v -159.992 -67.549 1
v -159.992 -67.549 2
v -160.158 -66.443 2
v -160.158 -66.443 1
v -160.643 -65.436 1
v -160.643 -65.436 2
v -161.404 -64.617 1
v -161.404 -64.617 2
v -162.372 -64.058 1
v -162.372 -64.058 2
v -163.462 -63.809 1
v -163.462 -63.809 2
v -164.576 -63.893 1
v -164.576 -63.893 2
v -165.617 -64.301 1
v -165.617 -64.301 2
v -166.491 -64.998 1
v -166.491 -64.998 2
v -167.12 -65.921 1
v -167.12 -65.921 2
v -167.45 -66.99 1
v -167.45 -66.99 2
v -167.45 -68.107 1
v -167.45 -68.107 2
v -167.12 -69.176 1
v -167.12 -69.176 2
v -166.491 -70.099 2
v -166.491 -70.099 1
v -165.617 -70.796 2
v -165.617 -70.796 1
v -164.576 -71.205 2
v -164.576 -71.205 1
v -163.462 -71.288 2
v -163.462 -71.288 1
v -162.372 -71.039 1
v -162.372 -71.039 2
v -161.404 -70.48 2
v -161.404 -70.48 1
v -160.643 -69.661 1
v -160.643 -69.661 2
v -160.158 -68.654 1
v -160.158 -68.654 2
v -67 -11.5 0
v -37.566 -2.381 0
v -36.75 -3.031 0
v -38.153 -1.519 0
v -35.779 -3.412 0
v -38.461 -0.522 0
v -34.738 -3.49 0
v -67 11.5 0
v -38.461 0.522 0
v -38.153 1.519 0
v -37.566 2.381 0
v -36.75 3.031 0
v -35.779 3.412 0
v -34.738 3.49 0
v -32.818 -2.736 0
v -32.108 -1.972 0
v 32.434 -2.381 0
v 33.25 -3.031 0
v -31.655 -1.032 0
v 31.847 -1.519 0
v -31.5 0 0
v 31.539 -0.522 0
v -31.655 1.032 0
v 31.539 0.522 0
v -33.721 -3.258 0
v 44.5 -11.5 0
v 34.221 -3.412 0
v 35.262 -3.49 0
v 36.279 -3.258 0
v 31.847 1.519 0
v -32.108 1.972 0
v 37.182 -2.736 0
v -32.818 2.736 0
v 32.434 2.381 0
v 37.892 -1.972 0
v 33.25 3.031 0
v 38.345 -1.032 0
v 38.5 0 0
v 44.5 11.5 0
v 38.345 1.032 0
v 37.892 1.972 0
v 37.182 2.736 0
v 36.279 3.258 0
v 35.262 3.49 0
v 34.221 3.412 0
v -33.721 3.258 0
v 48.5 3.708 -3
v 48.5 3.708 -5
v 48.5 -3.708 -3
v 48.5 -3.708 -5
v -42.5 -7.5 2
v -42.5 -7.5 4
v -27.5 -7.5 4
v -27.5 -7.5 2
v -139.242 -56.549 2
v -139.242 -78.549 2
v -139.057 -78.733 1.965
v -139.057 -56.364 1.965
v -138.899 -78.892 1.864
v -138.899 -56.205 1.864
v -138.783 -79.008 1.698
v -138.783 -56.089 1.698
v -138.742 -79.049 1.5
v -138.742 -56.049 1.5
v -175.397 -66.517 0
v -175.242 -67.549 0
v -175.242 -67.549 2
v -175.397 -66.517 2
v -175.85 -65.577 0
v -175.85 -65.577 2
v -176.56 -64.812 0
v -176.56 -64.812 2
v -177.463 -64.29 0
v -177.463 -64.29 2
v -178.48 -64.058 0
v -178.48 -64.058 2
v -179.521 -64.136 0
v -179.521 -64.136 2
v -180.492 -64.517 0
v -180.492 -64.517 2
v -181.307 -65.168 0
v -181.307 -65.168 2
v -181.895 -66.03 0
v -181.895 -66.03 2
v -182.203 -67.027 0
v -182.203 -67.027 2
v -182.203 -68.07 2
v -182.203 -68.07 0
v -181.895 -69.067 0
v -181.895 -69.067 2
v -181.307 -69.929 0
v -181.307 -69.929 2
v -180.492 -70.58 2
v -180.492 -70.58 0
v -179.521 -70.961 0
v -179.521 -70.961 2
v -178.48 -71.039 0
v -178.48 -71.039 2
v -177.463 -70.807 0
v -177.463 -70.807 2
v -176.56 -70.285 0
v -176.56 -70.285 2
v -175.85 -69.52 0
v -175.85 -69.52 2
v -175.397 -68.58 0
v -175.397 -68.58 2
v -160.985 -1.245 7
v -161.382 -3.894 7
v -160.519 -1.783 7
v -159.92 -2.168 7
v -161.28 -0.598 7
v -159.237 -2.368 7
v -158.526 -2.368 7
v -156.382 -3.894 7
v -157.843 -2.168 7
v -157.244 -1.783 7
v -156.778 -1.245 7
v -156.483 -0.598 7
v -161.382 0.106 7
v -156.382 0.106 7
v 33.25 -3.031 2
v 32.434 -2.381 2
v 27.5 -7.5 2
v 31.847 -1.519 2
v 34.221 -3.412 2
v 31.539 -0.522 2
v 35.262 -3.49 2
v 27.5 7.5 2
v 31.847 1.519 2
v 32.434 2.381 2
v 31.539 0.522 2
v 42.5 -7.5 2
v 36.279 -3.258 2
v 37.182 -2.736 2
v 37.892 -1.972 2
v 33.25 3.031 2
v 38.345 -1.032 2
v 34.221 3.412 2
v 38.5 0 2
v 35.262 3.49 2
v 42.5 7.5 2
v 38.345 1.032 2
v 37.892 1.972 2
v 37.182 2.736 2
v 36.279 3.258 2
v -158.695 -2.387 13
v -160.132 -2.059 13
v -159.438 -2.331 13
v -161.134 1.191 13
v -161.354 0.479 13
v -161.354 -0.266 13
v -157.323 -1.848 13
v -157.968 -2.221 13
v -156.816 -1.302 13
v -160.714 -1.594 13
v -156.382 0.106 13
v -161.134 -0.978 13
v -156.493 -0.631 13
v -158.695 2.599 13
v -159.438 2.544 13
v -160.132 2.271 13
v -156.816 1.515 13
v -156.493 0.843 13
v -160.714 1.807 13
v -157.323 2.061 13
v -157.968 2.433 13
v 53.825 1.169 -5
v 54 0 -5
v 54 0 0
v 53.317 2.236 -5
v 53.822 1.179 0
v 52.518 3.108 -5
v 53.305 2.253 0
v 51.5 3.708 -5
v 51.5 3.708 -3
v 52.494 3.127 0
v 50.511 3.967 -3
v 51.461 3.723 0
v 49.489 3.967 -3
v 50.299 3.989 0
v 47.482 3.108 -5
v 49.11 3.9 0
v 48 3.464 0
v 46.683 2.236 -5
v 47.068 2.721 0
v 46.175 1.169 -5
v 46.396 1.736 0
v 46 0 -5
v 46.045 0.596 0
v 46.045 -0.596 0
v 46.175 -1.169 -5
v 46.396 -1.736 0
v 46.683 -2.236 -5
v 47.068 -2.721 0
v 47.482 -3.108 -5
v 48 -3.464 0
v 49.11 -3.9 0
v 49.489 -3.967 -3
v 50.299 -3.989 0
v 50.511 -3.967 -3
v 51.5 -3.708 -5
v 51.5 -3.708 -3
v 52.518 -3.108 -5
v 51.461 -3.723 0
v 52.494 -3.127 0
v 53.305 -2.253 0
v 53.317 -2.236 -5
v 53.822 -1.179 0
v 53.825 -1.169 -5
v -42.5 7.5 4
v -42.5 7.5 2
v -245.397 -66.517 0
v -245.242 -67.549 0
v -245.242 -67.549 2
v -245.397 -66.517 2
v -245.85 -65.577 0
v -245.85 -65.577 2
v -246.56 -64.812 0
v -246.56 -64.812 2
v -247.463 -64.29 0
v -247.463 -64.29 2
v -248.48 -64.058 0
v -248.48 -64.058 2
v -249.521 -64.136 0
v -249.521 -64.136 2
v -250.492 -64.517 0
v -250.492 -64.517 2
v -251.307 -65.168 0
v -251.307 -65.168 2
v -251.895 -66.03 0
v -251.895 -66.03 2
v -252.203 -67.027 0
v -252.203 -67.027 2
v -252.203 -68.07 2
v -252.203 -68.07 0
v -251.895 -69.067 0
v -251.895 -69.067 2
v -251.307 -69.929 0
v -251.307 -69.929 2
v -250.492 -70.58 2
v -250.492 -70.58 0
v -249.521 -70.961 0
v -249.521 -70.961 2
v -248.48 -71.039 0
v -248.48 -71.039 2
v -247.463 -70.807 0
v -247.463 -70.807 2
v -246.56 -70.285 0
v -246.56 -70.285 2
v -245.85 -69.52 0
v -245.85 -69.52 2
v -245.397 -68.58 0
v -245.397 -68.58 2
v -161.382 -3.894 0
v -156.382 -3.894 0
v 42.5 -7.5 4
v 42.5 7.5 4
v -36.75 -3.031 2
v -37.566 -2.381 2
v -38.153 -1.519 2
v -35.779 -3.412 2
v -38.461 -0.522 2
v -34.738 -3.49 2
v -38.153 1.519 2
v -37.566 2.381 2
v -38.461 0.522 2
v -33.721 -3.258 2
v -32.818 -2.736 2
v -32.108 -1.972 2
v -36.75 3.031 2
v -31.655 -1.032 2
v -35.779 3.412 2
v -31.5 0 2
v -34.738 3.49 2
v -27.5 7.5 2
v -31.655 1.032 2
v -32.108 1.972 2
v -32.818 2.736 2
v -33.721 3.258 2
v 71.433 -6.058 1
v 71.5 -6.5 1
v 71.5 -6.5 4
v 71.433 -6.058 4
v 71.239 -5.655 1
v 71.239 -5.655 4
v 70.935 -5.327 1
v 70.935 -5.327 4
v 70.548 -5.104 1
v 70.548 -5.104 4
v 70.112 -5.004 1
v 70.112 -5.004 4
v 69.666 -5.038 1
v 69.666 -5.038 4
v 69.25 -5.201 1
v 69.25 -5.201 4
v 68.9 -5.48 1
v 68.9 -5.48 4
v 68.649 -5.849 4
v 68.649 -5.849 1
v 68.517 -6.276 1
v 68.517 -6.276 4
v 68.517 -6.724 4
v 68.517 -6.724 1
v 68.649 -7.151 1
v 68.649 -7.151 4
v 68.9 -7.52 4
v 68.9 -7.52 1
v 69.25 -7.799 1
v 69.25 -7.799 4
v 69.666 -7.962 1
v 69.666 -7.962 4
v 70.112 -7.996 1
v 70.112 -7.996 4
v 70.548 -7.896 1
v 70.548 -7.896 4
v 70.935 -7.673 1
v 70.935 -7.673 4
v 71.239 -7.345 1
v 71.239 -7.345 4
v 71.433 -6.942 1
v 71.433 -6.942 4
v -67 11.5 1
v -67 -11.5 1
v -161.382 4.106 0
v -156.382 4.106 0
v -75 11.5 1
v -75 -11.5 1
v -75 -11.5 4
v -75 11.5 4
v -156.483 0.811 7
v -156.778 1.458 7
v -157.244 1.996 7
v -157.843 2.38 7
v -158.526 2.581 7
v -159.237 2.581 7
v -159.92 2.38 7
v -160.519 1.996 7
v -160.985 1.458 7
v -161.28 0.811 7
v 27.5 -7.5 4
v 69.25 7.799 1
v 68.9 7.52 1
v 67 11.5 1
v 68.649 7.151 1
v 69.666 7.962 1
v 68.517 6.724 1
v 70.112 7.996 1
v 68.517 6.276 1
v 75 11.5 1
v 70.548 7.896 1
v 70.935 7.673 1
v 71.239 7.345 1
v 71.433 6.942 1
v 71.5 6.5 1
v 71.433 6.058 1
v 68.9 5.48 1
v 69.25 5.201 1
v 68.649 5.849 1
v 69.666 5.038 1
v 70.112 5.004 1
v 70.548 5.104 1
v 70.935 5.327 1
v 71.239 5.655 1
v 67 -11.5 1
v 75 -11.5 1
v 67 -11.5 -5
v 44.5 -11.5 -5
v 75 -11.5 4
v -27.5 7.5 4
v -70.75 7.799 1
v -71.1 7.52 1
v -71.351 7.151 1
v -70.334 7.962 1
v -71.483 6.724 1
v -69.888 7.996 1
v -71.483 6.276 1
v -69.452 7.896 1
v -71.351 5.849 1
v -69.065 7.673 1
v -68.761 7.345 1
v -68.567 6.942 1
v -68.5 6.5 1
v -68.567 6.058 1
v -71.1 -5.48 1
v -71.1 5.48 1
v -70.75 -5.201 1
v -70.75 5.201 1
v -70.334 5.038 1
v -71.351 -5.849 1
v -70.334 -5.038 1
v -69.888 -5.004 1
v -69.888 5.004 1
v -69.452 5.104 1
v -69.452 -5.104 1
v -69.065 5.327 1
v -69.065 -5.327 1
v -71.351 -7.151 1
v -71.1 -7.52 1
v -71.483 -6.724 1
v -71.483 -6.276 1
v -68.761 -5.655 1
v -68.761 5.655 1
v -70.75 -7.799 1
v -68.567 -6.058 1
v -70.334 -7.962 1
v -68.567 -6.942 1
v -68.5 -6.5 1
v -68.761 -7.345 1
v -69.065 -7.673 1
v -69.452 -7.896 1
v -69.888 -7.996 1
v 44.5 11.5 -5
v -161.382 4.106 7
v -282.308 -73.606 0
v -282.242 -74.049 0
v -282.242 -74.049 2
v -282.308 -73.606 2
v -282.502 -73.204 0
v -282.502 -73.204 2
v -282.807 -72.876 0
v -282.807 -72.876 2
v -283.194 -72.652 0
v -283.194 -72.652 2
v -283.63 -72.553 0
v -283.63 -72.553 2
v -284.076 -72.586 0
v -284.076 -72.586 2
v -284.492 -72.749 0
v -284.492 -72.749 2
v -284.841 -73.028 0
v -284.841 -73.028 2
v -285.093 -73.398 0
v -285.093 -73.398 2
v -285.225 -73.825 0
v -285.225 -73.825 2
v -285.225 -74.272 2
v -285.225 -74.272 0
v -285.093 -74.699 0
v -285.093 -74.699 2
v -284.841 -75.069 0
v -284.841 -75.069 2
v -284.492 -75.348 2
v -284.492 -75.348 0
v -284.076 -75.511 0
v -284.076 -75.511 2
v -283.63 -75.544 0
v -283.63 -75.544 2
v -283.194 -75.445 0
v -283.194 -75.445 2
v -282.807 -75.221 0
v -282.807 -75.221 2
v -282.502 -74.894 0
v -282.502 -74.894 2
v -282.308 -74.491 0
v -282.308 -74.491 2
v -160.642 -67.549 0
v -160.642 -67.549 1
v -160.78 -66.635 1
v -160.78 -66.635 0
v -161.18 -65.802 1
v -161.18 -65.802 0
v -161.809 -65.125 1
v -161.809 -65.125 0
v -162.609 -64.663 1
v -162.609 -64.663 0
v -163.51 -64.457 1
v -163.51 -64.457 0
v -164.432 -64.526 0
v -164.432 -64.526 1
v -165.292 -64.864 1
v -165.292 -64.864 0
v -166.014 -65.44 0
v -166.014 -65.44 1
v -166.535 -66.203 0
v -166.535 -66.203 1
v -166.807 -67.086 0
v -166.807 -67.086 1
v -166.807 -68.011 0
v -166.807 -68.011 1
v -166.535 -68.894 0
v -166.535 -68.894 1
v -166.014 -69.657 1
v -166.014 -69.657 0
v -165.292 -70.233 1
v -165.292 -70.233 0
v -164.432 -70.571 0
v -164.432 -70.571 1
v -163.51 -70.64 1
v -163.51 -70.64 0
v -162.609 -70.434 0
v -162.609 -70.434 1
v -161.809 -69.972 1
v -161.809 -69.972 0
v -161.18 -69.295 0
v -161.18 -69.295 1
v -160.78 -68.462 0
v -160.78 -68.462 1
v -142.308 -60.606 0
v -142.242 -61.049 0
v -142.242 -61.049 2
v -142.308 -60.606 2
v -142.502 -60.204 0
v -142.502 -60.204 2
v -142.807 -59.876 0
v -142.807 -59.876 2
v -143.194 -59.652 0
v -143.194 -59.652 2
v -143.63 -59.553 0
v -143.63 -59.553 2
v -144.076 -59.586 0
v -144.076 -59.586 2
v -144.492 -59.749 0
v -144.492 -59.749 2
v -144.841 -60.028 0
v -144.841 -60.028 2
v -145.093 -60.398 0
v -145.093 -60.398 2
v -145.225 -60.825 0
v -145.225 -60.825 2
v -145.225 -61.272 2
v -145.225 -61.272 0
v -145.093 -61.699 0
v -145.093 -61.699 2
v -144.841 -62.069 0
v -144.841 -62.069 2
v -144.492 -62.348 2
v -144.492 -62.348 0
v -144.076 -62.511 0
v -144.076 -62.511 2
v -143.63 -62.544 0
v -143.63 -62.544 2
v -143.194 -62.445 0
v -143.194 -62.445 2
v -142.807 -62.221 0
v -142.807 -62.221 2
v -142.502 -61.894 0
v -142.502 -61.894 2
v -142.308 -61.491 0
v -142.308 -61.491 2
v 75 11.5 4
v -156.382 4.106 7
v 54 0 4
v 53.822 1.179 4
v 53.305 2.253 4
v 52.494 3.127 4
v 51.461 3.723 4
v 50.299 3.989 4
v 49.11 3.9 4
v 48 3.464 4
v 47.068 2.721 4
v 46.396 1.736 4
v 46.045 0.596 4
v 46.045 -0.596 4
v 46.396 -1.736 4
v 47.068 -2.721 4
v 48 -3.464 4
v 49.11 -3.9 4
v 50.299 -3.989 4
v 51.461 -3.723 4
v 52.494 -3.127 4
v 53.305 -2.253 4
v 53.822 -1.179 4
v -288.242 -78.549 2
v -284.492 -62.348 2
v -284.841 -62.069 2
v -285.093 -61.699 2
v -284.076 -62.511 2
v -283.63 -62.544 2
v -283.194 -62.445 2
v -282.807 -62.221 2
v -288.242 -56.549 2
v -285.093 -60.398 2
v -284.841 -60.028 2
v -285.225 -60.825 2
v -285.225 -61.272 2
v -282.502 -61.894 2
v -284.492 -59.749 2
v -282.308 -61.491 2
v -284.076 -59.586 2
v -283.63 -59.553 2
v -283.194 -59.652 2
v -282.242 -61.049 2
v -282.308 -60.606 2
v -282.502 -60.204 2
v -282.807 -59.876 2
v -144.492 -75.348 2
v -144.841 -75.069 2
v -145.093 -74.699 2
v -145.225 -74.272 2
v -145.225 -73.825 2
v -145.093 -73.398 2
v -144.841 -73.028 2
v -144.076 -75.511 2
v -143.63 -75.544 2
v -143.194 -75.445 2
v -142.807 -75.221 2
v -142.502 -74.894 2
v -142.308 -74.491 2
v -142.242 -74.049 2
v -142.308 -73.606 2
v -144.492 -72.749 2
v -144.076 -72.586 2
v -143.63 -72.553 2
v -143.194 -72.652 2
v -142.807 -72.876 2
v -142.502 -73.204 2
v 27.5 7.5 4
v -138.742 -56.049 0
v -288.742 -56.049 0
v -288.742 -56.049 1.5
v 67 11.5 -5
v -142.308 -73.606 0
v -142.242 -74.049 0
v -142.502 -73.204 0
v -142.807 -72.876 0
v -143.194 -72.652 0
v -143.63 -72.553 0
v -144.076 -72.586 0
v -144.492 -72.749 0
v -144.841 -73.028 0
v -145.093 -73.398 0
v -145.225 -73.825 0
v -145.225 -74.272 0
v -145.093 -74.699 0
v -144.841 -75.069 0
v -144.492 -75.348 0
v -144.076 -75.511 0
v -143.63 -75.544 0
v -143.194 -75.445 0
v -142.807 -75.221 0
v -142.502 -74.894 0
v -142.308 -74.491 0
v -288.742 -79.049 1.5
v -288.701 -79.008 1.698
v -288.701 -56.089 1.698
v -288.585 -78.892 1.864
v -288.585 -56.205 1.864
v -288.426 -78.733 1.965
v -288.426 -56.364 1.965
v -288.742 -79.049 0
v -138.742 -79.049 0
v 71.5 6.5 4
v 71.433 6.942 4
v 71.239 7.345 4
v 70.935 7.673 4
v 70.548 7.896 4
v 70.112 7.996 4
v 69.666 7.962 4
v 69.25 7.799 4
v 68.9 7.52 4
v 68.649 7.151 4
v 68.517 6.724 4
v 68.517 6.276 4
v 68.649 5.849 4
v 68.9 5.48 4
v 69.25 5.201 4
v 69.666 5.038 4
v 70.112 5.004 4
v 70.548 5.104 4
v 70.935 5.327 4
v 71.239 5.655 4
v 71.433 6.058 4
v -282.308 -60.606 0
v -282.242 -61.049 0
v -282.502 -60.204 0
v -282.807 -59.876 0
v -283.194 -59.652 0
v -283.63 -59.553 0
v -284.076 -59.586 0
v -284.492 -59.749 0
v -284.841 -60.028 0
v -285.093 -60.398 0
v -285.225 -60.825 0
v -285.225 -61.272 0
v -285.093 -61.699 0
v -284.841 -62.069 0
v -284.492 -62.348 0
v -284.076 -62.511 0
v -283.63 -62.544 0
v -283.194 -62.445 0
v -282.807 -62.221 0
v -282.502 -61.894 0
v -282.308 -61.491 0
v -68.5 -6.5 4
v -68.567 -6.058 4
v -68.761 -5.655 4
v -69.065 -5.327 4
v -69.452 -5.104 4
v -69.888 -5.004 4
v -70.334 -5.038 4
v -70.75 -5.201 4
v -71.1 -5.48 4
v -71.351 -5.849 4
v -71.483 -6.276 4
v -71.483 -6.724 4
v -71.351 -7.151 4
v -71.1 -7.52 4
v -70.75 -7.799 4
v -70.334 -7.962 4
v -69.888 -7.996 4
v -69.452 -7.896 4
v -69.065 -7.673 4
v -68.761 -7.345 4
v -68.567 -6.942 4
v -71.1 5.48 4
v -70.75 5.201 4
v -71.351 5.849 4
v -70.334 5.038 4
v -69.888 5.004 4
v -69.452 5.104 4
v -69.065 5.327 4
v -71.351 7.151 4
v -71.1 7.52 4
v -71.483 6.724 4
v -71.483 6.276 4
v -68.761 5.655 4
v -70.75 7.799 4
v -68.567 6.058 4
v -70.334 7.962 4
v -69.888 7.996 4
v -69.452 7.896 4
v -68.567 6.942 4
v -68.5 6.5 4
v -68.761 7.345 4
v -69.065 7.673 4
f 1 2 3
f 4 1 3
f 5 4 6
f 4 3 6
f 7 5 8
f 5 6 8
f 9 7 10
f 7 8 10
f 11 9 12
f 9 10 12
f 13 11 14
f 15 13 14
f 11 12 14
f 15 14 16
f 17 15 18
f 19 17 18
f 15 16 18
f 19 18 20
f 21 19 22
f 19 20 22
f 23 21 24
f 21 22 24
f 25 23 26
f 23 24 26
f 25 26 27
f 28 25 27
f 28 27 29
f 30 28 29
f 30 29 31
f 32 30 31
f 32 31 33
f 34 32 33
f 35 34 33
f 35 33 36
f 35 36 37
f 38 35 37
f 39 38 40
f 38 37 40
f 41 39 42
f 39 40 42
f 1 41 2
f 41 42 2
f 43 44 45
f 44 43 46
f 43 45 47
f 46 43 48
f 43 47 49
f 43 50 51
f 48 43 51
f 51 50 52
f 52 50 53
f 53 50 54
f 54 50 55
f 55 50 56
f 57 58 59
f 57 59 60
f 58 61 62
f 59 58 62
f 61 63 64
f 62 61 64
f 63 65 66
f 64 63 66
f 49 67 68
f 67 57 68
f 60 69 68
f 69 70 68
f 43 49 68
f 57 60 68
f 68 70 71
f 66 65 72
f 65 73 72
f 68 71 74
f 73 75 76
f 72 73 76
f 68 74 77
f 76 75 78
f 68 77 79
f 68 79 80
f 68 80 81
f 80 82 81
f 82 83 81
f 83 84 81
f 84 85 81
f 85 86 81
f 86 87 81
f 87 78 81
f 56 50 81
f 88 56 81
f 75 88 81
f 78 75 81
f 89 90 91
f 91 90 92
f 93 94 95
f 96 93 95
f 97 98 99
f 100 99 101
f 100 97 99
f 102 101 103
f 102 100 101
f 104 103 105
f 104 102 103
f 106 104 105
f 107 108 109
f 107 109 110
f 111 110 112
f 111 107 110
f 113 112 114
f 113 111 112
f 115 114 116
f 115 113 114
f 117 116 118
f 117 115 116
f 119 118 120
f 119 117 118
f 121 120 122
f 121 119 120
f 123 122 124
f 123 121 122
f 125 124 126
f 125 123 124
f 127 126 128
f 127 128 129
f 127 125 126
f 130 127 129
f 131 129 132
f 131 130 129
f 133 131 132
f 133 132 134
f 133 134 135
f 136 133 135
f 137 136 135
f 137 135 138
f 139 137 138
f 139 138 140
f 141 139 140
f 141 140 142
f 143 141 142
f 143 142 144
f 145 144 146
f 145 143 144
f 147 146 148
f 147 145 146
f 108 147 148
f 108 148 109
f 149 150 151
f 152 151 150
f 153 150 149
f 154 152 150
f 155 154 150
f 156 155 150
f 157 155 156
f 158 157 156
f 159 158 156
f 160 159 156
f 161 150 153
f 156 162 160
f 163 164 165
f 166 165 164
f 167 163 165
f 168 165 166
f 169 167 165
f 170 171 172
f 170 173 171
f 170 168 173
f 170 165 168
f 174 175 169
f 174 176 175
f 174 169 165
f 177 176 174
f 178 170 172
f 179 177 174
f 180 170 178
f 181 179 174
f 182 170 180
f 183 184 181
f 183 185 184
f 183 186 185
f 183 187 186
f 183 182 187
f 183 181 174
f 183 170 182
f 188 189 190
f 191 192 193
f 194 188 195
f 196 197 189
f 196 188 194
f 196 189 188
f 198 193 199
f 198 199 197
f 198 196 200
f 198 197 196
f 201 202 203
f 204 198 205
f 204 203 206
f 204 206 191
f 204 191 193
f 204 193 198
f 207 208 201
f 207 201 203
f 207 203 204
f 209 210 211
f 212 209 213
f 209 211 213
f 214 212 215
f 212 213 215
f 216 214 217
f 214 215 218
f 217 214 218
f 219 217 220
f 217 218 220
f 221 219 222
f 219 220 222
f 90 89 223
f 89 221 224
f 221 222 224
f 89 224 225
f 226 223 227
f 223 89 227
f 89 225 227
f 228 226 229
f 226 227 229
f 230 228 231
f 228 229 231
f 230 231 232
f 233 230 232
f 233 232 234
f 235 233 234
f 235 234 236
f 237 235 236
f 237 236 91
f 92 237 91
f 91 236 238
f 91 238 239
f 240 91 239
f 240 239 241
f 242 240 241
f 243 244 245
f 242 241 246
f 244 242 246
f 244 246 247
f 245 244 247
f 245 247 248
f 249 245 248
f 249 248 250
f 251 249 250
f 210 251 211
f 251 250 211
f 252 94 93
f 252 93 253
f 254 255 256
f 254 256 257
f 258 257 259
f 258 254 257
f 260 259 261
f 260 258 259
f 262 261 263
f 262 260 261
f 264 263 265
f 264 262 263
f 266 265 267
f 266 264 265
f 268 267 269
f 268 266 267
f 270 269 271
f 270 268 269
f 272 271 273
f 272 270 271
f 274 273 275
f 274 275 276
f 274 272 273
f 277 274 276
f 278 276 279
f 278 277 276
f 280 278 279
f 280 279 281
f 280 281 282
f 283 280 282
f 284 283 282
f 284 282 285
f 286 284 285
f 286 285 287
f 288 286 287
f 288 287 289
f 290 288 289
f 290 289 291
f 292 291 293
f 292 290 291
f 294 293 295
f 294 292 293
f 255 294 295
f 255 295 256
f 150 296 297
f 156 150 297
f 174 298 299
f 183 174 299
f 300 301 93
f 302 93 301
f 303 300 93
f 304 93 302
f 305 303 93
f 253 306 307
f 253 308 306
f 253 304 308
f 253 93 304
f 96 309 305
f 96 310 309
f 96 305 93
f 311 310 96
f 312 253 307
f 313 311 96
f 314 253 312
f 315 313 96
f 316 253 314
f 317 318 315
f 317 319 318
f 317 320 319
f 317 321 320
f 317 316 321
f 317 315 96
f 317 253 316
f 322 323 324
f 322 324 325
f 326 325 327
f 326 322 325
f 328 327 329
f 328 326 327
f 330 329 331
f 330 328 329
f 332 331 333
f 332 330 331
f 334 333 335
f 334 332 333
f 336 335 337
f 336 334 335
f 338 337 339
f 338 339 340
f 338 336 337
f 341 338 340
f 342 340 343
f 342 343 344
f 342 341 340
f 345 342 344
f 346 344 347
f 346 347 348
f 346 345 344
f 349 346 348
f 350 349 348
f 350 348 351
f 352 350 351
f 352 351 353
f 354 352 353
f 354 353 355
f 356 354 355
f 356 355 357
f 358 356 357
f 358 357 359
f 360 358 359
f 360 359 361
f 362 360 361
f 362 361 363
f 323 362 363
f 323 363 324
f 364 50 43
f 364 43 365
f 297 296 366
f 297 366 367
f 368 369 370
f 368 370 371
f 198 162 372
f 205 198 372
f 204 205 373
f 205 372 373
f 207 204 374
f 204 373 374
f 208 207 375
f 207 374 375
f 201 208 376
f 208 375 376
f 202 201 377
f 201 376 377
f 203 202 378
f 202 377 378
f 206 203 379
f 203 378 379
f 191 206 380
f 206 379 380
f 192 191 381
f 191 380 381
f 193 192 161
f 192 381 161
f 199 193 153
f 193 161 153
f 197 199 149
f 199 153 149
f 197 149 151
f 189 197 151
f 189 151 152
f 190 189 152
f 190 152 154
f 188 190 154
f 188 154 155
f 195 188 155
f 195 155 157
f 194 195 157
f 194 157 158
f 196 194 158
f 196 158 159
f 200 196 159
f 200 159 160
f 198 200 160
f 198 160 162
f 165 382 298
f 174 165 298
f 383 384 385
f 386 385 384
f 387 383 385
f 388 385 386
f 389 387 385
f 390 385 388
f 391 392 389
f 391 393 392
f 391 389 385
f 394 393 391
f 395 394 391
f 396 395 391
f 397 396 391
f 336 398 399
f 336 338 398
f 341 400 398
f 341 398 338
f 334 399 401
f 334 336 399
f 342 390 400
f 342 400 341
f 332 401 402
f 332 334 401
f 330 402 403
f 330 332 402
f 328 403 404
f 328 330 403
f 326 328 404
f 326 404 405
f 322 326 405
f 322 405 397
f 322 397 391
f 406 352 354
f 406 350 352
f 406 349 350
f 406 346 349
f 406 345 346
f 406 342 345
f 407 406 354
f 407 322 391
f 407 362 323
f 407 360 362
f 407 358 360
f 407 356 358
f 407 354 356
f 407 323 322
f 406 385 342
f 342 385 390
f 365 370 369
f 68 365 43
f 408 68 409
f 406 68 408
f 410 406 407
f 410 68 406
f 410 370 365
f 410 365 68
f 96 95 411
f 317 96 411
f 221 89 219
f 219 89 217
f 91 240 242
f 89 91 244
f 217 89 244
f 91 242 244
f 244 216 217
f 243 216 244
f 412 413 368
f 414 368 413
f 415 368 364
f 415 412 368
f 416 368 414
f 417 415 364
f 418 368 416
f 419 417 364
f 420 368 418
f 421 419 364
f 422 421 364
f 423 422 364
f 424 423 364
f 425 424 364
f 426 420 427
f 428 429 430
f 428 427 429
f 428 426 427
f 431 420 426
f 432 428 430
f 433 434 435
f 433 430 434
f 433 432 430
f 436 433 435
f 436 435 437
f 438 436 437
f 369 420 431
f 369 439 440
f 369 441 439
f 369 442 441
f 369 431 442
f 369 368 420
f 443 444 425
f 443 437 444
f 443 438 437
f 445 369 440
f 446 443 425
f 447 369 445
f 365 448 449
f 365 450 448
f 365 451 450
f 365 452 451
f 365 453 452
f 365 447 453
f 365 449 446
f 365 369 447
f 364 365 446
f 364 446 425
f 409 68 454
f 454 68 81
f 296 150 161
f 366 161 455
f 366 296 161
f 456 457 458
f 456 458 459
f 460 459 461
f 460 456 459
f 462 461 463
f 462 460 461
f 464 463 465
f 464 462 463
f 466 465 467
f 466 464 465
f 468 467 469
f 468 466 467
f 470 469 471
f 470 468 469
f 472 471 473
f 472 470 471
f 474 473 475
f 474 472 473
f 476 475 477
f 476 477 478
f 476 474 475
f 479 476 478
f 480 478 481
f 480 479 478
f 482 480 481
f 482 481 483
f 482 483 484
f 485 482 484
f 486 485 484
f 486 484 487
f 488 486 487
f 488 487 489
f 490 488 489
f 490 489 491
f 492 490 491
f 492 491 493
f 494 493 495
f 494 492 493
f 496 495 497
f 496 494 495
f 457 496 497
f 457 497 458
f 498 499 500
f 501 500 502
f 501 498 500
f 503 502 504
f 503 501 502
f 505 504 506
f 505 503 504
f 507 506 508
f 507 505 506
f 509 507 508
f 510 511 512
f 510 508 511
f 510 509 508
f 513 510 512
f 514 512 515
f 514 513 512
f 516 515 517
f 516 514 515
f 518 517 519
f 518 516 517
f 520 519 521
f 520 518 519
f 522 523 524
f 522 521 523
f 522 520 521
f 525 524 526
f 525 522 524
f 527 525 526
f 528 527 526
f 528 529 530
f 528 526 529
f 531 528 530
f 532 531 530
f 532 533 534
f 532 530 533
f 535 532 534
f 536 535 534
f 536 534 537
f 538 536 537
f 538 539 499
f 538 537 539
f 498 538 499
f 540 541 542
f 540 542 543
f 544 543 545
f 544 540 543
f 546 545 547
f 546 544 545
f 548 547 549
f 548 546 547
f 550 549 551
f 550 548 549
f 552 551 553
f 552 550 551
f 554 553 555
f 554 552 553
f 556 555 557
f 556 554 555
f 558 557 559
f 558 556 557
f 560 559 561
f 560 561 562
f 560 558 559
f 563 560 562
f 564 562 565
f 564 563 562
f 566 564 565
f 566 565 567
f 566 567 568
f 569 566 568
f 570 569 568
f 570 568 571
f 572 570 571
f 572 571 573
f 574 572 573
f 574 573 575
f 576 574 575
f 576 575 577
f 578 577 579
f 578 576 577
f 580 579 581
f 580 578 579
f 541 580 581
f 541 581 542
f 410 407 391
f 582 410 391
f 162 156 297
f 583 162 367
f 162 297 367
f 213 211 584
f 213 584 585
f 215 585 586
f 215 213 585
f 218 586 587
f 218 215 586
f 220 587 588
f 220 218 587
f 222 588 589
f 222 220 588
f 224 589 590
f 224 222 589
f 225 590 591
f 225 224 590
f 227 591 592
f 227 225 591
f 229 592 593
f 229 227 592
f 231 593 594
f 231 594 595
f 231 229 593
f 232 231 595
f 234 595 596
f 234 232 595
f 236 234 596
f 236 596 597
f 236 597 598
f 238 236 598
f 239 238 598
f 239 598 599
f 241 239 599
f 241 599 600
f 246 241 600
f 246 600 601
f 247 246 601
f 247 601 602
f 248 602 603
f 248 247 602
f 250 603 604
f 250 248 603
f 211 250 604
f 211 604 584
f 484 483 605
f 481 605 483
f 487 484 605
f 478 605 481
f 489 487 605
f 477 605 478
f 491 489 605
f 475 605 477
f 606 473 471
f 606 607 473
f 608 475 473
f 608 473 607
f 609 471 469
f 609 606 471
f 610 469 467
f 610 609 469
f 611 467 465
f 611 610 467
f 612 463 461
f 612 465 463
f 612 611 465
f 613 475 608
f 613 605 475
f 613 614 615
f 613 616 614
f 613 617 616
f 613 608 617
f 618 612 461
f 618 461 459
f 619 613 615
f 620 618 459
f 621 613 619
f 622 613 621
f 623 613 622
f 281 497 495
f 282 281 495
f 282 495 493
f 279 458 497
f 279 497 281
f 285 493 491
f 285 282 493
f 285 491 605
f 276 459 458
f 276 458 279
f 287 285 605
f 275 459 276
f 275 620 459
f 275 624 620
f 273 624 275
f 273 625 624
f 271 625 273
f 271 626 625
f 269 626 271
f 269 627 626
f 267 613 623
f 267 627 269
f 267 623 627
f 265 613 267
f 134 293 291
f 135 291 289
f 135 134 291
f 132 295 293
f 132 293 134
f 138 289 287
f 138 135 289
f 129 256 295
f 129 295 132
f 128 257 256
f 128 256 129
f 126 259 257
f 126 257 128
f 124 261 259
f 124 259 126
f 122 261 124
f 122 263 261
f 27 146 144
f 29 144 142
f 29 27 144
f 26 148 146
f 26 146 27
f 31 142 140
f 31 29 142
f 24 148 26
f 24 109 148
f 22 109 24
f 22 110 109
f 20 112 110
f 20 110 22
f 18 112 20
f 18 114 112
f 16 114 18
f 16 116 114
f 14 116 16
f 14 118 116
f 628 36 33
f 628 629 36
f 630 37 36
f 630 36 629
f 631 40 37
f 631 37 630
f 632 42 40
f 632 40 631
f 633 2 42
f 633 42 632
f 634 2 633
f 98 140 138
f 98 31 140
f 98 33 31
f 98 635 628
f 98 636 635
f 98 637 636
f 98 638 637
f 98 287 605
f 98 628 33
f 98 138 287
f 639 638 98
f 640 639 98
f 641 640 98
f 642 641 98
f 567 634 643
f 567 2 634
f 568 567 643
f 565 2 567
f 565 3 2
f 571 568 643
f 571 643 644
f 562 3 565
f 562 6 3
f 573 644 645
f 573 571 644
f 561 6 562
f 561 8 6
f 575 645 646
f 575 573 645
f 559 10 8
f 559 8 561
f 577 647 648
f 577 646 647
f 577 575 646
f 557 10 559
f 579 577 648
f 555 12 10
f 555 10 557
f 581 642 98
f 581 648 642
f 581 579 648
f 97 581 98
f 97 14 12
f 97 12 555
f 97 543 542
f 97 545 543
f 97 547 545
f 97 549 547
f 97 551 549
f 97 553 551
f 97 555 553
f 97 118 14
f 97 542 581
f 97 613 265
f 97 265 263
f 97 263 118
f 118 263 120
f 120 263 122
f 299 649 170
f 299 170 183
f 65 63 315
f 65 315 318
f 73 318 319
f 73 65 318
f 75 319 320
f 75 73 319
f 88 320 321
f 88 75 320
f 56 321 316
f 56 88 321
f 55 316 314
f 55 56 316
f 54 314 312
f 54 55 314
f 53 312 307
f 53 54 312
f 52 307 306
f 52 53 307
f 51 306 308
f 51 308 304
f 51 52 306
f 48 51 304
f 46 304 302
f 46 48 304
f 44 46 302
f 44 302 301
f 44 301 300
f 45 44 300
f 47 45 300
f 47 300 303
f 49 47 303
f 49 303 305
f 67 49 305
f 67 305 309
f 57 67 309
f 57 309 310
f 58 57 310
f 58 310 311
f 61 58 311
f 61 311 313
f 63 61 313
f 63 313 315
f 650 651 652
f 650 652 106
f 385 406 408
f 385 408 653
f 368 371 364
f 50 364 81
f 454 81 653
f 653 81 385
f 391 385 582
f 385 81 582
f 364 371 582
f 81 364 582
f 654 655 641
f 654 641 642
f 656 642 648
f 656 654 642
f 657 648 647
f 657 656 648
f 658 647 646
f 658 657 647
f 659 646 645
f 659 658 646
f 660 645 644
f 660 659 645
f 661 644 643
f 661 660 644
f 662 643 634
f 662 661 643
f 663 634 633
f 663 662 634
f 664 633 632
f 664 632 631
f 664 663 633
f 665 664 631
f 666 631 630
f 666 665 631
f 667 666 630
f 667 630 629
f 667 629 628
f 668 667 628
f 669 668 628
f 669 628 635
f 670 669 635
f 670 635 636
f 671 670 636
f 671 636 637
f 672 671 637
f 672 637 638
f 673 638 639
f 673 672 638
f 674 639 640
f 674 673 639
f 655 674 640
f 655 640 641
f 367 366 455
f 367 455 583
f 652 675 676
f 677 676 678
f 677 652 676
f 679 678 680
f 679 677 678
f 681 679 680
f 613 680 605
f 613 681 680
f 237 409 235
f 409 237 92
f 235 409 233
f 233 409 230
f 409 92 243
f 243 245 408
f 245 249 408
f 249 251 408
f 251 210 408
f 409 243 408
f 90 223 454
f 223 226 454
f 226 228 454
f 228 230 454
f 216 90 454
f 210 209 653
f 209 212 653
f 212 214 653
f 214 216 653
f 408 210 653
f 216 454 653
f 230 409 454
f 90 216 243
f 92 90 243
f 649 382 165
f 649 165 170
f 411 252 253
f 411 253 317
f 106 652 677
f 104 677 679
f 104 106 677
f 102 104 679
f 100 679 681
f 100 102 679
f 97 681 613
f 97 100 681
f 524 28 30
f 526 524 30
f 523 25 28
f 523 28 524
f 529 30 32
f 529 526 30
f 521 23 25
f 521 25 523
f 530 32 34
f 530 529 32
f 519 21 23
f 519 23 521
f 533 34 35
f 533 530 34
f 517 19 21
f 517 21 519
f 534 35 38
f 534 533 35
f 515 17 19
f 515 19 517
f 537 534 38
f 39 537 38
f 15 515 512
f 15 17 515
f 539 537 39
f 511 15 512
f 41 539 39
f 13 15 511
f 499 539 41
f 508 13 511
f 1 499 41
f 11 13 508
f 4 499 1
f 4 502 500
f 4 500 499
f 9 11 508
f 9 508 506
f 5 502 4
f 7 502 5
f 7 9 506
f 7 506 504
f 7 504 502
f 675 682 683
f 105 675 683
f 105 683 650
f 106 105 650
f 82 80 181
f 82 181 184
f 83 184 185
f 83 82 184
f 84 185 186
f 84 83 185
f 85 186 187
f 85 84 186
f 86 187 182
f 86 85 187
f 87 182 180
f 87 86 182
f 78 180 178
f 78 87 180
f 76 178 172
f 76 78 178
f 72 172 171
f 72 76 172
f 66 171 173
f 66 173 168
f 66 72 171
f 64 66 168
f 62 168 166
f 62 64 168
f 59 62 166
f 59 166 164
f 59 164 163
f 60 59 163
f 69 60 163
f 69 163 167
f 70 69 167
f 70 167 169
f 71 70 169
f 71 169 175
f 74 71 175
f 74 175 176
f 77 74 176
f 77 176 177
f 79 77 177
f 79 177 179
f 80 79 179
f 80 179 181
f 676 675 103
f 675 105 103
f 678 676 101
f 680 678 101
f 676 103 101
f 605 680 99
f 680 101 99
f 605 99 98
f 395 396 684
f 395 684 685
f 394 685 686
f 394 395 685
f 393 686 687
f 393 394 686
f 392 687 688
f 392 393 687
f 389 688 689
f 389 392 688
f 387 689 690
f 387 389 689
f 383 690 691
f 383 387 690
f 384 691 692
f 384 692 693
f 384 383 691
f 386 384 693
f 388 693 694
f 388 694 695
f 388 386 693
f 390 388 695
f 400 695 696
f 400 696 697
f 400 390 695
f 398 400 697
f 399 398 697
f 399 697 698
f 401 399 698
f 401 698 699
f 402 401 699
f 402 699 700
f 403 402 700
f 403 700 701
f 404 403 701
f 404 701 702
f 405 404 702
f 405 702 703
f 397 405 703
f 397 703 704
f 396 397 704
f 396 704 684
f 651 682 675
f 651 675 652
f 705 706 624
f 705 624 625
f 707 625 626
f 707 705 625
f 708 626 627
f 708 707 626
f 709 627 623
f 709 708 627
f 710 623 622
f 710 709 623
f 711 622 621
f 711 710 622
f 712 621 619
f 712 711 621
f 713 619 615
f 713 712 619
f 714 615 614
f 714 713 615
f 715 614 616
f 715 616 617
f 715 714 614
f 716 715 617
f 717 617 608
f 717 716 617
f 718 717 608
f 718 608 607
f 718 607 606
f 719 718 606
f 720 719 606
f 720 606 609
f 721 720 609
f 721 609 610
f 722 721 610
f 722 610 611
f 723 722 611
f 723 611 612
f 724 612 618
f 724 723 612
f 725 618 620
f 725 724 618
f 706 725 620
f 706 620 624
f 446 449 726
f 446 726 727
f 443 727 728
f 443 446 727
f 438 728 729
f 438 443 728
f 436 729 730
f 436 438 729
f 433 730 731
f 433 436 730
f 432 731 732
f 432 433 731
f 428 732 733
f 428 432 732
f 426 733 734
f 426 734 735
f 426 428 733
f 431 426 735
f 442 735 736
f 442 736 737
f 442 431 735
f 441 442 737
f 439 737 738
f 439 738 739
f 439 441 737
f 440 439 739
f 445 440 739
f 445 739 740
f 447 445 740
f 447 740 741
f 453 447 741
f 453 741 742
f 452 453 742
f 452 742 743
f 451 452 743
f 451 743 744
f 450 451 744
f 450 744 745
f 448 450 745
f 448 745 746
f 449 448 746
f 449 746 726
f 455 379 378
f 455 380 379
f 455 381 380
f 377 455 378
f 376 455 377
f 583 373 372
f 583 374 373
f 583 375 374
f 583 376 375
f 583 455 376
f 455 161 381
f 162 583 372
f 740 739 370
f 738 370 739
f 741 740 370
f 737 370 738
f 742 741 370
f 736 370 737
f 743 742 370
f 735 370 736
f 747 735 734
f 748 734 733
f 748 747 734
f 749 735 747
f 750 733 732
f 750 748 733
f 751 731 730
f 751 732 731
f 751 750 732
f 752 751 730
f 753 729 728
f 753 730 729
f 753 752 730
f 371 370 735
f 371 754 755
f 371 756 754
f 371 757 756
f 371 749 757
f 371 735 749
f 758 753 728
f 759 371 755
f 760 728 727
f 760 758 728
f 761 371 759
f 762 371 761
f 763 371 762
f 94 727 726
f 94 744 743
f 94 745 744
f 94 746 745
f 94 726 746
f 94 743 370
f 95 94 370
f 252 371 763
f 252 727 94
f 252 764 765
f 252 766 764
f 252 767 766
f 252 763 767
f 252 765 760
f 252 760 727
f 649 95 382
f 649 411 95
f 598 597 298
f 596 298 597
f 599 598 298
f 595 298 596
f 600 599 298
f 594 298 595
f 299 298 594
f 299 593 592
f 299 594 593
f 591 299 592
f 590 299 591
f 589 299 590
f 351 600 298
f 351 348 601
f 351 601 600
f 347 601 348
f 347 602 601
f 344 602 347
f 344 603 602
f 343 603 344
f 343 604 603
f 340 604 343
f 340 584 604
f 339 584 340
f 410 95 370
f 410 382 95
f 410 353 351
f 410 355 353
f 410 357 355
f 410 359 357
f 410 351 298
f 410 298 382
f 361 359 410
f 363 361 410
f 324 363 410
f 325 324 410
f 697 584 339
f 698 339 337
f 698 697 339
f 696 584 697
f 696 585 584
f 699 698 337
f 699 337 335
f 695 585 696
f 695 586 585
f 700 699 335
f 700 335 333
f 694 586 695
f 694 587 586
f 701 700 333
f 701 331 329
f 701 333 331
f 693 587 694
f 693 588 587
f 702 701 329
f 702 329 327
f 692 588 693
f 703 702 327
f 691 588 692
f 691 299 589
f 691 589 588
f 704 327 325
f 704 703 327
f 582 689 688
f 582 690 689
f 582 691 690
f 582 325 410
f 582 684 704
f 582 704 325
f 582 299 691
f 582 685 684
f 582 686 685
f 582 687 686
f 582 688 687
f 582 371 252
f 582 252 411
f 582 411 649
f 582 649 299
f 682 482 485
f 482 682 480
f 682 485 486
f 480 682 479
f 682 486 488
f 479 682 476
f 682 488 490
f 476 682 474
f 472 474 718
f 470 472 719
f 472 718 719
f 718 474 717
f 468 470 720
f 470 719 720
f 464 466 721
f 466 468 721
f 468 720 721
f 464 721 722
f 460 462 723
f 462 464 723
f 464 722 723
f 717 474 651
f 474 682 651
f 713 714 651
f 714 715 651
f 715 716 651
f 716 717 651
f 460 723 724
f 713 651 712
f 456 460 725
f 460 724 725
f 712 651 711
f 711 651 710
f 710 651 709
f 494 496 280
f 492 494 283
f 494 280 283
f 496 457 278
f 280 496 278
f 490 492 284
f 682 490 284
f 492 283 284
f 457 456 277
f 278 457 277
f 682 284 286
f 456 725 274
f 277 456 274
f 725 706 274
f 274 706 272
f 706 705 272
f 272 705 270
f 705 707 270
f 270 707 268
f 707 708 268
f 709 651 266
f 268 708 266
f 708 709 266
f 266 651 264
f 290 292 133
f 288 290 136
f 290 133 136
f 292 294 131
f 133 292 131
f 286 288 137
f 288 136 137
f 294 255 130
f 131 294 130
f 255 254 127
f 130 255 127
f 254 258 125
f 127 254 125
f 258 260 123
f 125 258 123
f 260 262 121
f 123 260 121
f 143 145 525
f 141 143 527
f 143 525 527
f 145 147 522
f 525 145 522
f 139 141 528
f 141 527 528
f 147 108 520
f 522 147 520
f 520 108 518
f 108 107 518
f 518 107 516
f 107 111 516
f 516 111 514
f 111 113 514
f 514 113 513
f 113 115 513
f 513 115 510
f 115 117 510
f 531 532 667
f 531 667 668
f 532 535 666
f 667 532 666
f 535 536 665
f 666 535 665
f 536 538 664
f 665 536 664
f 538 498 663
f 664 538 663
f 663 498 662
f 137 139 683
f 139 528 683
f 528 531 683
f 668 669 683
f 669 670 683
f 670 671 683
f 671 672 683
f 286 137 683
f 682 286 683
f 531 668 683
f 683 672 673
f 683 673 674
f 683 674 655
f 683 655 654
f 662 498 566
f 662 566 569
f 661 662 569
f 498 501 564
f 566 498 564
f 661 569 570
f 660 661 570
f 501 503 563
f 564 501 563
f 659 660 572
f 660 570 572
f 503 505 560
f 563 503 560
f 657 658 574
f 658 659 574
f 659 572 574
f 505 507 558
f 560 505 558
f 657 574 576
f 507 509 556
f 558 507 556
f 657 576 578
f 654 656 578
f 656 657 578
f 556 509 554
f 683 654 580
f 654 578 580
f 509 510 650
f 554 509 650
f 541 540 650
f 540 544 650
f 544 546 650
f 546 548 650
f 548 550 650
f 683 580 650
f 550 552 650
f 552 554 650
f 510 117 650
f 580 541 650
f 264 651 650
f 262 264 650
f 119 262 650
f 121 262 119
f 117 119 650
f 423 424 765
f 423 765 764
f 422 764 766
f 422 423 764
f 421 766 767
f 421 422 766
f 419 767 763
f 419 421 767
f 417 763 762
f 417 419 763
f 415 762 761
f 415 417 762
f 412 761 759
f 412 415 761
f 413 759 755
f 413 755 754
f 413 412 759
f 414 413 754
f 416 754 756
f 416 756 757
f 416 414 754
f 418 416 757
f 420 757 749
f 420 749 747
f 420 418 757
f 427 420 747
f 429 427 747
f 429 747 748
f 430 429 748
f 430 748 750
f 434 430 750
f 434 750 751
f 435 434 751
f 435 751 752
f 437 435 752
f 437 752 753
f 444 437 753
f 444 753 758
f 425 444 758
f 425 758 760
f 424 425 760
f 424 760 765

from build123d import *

# Parameters (mm, degrees)
F1_W      = 5
F1_H      = 8
F2_DEPTH  = 7
F4_DEPTH  = 6
F0_W      = 150
F0_H      = 23
F0_R      = 1.5
F0_R_2    = 3.5
F0_R_3    = 4
F5_DEPTH  = 4
F6_W      = 150
F6_H      = 23
F6_R      = 1.5
F6_R_2    = 3.5
F6_R_3    = 3.1
F7_DEPTH  = 2
F8_R      = 3.75
F9_DEPTH  = 1
F10_W     = 8
F10_H     = 1
F11_DEPTH = 30
F12_W     = 15
F12_H     = 15
F12_R     = 3.5
F13_DEPTH = 2
F14_R     = 4
F15_DEPTH = 3
F17_R     = 0.5
F16_W     = 22.5
F16_H     = 23
F16_R     = 4
F18_DEPTH = 5
F19_W     = 3
F19_H     = 7.4161984871
F20_DEPTH = 2


with BuildPart() as f2:
    # F1 (on Top) → F2 (new body)
    with BuildSketch(Plane.XY):
        with Locations((-158.8816171885, 0.1063133087)):
            Rectangle(F1_W, F1_H)
    extrude(amount=F2_DEPTH)

    # F3 (on face) → F4 (join)
    with BuildSketch(Plane.XY.offset(7)):
        with BuildLine():
            ThreePointArc((-161.3816171885, 0.1063133087), (-158.8816171885, -2.3936866913), (-156.3816171885, 0.1063133087))
            ThreePointArc((-156.3816171885, 0.1063133087), (-158.8816171885, 2.6063133087), (-161.3816171885, 0.1063133087))
        make_face()
    extrude(amount=F4_DEPTH)

    # F14 (on face) → F15 (cut)
    with BuildSketch(Plane.XY.offset(4)):
        with Locations((50, 0)):
            Circle(F14_R)
    extrude(amount=-F15_DEPTH, mode=Mode.SUBTRACT)


with BuildPart() as f5:
    # F0 (on Top) → F5 (new body)
    with BuildSketch(Plane.XY):
        Rectangle(F0_W, F0_H)
        with Locations((-70, -6.5)):
            Circle(F0_R, mode=Mode.SUBTRACT)
        with Locations((70, -6.5)):
            Circle(F0_R, mode=Mode.SUBTRACT)
        with Locations((-35, 0)):
            Circle(F0_R_2, mode=Mode.SUBTRACT)
        with Locations((-70, 6.5)):
            Circle(F0_R, mode=Mode.SUBTRACT)
        with Locations((35, 0)):
            Circle(F0_R_2, mode=Mode.SUBTRACT)
        with Locations((50, 0)):
            Circle(F0_R_3, mode=Mode.SUBTRACT)
        with Locations((70, 6.5)):
            Circle(F0_R, mode=Mode.SUBTRACT)
    extrude(amount=F5_DEPTH)

    # F10 (on face) → F11 (cut)
    with BuildSketch(Plane.XZ.offset(11.5)):
        with Locations((-71, 0.5)):
            Rectangle(F10_W, F10_H)
        with Locations((71, 0.5)):
            Rectangle(F10_W, F10_H)
    extrude(amount=-F11_DEPTH, mode=Mode.SUBTRACT)

    # F12 (on face) → F13 (cut)
    with BuildSketch(Plane.XY.offset(4)):
        with Locations((-35, 0)):
            Rectangle(F12_W, F12_H)
        with Locations((-35, 0)):
            Circle(F12_R, mode=Mode.SUBTRACT)
        with Locations((35, 0)):
            Rectangle(F12_W, F12_H)
        with Locations((35, 0)):
            Circle(F12_R, mode=Mode.SUBTRACT)
    extrude(amount=-F13_DEPTH, mode=Mode.SUBTRACT)

    # F16 (on face) → F18 (join)
    with BuildSketch(Plane.XY):
        with Locations((55.75, 0)):
            Rectangle(F16_W, F16_H)
        with Locations((50, 0)):
            Circle(F16_R, mode=Mode.SUBTRACT)
    extrude(amount=-F18_DEPTH)

    # F19 (on face) → F20 (join)
    with BuildSketch(Plane(origin=(0, 0, -5), x_dir=(1, 0, 0), z_dir=(0, 0, -1))):
        with Locations((50, 0)):
            Rectangle(F19_W, F19_H)
        with BuildLine():
            Line((48.5, 3.7080992435), (51.5, 3.7080992435))
            ThreePointArc((51.5, 3.7080992435), (50, 4), (48.5, 3.7080992435))
        make_face()
        with BuildLine():
            ThreePointArc((48.5, -3.7080992435), (50, -4), (51.5, -3.7080992435))
            Line((51.5, -3.7080992435), (48.5, -3.7080992435))
        make_face()
    extrude(amount=-F20_DEPTH)


with BuildPart() as f7:
    # F6 (on Top) → F7 (new body)
    with BuildSketch(Plane.XY):
        with Locations((-213.7417785823, -67.5485283136)):
            Rectangle(F6_W, F6_H)
        with Locations((-283.7417785823, -74.0485283136)):
            Circle(F6_R, mode=Mode.SUBTRACT)
        with Locations((-143.7417785823, -74.0485283136)):
            Circle(F6_R, mode=Mode.SUBTRACT)
        with Locations((-248.7417785823, -67.5485283136)):
            Circle(F6_R_2, mode=Mode.SUBTRACT)
        with Locations((-283.7417785823, -61.0485283136)):
            Circle(F6_R, mode=Mode.SUBTRACT)
        with Locations((-178.7417785823, -67.5485283136)):
            Circle(F6_R_2, mode=Mode.SUBTRACT)
        with Locations((-163.7417785823, -67.5485283136)):
            Circle(F6_R_3, mode=Mode.SUBTRACT)
        with Locations((-143.7417785823, -61.0485283136)):
            Circle(F6_R, mode=Mode.SUBTRACT)
    extrude(amount=F7_DEPTH)

    # F8 (on face) → F9 (cut)
    with BuildSketch(Plane.XY.offset(2)):
        with Locations((-163.7417785823, -67.5485283136)):
            Circle(F8_R)
    extrude(amount=-F9_DEPTH, mode=Mode.SUBTRACT)

    # F17
    f17_edges = [f7.edges().sort_by_distance(p)[0] for p in [
        (-288.741779, -67.548528, 2),
        (-213.741779, -56.048528, 2),
        (-213.741779, -79.048528, 2),
        (-138.741779, -67.548528, 2),
    ]]
    fillet(f17_edges, radius=F17_R)


solid = Compound([f2.part, f5.part, f7.part])
